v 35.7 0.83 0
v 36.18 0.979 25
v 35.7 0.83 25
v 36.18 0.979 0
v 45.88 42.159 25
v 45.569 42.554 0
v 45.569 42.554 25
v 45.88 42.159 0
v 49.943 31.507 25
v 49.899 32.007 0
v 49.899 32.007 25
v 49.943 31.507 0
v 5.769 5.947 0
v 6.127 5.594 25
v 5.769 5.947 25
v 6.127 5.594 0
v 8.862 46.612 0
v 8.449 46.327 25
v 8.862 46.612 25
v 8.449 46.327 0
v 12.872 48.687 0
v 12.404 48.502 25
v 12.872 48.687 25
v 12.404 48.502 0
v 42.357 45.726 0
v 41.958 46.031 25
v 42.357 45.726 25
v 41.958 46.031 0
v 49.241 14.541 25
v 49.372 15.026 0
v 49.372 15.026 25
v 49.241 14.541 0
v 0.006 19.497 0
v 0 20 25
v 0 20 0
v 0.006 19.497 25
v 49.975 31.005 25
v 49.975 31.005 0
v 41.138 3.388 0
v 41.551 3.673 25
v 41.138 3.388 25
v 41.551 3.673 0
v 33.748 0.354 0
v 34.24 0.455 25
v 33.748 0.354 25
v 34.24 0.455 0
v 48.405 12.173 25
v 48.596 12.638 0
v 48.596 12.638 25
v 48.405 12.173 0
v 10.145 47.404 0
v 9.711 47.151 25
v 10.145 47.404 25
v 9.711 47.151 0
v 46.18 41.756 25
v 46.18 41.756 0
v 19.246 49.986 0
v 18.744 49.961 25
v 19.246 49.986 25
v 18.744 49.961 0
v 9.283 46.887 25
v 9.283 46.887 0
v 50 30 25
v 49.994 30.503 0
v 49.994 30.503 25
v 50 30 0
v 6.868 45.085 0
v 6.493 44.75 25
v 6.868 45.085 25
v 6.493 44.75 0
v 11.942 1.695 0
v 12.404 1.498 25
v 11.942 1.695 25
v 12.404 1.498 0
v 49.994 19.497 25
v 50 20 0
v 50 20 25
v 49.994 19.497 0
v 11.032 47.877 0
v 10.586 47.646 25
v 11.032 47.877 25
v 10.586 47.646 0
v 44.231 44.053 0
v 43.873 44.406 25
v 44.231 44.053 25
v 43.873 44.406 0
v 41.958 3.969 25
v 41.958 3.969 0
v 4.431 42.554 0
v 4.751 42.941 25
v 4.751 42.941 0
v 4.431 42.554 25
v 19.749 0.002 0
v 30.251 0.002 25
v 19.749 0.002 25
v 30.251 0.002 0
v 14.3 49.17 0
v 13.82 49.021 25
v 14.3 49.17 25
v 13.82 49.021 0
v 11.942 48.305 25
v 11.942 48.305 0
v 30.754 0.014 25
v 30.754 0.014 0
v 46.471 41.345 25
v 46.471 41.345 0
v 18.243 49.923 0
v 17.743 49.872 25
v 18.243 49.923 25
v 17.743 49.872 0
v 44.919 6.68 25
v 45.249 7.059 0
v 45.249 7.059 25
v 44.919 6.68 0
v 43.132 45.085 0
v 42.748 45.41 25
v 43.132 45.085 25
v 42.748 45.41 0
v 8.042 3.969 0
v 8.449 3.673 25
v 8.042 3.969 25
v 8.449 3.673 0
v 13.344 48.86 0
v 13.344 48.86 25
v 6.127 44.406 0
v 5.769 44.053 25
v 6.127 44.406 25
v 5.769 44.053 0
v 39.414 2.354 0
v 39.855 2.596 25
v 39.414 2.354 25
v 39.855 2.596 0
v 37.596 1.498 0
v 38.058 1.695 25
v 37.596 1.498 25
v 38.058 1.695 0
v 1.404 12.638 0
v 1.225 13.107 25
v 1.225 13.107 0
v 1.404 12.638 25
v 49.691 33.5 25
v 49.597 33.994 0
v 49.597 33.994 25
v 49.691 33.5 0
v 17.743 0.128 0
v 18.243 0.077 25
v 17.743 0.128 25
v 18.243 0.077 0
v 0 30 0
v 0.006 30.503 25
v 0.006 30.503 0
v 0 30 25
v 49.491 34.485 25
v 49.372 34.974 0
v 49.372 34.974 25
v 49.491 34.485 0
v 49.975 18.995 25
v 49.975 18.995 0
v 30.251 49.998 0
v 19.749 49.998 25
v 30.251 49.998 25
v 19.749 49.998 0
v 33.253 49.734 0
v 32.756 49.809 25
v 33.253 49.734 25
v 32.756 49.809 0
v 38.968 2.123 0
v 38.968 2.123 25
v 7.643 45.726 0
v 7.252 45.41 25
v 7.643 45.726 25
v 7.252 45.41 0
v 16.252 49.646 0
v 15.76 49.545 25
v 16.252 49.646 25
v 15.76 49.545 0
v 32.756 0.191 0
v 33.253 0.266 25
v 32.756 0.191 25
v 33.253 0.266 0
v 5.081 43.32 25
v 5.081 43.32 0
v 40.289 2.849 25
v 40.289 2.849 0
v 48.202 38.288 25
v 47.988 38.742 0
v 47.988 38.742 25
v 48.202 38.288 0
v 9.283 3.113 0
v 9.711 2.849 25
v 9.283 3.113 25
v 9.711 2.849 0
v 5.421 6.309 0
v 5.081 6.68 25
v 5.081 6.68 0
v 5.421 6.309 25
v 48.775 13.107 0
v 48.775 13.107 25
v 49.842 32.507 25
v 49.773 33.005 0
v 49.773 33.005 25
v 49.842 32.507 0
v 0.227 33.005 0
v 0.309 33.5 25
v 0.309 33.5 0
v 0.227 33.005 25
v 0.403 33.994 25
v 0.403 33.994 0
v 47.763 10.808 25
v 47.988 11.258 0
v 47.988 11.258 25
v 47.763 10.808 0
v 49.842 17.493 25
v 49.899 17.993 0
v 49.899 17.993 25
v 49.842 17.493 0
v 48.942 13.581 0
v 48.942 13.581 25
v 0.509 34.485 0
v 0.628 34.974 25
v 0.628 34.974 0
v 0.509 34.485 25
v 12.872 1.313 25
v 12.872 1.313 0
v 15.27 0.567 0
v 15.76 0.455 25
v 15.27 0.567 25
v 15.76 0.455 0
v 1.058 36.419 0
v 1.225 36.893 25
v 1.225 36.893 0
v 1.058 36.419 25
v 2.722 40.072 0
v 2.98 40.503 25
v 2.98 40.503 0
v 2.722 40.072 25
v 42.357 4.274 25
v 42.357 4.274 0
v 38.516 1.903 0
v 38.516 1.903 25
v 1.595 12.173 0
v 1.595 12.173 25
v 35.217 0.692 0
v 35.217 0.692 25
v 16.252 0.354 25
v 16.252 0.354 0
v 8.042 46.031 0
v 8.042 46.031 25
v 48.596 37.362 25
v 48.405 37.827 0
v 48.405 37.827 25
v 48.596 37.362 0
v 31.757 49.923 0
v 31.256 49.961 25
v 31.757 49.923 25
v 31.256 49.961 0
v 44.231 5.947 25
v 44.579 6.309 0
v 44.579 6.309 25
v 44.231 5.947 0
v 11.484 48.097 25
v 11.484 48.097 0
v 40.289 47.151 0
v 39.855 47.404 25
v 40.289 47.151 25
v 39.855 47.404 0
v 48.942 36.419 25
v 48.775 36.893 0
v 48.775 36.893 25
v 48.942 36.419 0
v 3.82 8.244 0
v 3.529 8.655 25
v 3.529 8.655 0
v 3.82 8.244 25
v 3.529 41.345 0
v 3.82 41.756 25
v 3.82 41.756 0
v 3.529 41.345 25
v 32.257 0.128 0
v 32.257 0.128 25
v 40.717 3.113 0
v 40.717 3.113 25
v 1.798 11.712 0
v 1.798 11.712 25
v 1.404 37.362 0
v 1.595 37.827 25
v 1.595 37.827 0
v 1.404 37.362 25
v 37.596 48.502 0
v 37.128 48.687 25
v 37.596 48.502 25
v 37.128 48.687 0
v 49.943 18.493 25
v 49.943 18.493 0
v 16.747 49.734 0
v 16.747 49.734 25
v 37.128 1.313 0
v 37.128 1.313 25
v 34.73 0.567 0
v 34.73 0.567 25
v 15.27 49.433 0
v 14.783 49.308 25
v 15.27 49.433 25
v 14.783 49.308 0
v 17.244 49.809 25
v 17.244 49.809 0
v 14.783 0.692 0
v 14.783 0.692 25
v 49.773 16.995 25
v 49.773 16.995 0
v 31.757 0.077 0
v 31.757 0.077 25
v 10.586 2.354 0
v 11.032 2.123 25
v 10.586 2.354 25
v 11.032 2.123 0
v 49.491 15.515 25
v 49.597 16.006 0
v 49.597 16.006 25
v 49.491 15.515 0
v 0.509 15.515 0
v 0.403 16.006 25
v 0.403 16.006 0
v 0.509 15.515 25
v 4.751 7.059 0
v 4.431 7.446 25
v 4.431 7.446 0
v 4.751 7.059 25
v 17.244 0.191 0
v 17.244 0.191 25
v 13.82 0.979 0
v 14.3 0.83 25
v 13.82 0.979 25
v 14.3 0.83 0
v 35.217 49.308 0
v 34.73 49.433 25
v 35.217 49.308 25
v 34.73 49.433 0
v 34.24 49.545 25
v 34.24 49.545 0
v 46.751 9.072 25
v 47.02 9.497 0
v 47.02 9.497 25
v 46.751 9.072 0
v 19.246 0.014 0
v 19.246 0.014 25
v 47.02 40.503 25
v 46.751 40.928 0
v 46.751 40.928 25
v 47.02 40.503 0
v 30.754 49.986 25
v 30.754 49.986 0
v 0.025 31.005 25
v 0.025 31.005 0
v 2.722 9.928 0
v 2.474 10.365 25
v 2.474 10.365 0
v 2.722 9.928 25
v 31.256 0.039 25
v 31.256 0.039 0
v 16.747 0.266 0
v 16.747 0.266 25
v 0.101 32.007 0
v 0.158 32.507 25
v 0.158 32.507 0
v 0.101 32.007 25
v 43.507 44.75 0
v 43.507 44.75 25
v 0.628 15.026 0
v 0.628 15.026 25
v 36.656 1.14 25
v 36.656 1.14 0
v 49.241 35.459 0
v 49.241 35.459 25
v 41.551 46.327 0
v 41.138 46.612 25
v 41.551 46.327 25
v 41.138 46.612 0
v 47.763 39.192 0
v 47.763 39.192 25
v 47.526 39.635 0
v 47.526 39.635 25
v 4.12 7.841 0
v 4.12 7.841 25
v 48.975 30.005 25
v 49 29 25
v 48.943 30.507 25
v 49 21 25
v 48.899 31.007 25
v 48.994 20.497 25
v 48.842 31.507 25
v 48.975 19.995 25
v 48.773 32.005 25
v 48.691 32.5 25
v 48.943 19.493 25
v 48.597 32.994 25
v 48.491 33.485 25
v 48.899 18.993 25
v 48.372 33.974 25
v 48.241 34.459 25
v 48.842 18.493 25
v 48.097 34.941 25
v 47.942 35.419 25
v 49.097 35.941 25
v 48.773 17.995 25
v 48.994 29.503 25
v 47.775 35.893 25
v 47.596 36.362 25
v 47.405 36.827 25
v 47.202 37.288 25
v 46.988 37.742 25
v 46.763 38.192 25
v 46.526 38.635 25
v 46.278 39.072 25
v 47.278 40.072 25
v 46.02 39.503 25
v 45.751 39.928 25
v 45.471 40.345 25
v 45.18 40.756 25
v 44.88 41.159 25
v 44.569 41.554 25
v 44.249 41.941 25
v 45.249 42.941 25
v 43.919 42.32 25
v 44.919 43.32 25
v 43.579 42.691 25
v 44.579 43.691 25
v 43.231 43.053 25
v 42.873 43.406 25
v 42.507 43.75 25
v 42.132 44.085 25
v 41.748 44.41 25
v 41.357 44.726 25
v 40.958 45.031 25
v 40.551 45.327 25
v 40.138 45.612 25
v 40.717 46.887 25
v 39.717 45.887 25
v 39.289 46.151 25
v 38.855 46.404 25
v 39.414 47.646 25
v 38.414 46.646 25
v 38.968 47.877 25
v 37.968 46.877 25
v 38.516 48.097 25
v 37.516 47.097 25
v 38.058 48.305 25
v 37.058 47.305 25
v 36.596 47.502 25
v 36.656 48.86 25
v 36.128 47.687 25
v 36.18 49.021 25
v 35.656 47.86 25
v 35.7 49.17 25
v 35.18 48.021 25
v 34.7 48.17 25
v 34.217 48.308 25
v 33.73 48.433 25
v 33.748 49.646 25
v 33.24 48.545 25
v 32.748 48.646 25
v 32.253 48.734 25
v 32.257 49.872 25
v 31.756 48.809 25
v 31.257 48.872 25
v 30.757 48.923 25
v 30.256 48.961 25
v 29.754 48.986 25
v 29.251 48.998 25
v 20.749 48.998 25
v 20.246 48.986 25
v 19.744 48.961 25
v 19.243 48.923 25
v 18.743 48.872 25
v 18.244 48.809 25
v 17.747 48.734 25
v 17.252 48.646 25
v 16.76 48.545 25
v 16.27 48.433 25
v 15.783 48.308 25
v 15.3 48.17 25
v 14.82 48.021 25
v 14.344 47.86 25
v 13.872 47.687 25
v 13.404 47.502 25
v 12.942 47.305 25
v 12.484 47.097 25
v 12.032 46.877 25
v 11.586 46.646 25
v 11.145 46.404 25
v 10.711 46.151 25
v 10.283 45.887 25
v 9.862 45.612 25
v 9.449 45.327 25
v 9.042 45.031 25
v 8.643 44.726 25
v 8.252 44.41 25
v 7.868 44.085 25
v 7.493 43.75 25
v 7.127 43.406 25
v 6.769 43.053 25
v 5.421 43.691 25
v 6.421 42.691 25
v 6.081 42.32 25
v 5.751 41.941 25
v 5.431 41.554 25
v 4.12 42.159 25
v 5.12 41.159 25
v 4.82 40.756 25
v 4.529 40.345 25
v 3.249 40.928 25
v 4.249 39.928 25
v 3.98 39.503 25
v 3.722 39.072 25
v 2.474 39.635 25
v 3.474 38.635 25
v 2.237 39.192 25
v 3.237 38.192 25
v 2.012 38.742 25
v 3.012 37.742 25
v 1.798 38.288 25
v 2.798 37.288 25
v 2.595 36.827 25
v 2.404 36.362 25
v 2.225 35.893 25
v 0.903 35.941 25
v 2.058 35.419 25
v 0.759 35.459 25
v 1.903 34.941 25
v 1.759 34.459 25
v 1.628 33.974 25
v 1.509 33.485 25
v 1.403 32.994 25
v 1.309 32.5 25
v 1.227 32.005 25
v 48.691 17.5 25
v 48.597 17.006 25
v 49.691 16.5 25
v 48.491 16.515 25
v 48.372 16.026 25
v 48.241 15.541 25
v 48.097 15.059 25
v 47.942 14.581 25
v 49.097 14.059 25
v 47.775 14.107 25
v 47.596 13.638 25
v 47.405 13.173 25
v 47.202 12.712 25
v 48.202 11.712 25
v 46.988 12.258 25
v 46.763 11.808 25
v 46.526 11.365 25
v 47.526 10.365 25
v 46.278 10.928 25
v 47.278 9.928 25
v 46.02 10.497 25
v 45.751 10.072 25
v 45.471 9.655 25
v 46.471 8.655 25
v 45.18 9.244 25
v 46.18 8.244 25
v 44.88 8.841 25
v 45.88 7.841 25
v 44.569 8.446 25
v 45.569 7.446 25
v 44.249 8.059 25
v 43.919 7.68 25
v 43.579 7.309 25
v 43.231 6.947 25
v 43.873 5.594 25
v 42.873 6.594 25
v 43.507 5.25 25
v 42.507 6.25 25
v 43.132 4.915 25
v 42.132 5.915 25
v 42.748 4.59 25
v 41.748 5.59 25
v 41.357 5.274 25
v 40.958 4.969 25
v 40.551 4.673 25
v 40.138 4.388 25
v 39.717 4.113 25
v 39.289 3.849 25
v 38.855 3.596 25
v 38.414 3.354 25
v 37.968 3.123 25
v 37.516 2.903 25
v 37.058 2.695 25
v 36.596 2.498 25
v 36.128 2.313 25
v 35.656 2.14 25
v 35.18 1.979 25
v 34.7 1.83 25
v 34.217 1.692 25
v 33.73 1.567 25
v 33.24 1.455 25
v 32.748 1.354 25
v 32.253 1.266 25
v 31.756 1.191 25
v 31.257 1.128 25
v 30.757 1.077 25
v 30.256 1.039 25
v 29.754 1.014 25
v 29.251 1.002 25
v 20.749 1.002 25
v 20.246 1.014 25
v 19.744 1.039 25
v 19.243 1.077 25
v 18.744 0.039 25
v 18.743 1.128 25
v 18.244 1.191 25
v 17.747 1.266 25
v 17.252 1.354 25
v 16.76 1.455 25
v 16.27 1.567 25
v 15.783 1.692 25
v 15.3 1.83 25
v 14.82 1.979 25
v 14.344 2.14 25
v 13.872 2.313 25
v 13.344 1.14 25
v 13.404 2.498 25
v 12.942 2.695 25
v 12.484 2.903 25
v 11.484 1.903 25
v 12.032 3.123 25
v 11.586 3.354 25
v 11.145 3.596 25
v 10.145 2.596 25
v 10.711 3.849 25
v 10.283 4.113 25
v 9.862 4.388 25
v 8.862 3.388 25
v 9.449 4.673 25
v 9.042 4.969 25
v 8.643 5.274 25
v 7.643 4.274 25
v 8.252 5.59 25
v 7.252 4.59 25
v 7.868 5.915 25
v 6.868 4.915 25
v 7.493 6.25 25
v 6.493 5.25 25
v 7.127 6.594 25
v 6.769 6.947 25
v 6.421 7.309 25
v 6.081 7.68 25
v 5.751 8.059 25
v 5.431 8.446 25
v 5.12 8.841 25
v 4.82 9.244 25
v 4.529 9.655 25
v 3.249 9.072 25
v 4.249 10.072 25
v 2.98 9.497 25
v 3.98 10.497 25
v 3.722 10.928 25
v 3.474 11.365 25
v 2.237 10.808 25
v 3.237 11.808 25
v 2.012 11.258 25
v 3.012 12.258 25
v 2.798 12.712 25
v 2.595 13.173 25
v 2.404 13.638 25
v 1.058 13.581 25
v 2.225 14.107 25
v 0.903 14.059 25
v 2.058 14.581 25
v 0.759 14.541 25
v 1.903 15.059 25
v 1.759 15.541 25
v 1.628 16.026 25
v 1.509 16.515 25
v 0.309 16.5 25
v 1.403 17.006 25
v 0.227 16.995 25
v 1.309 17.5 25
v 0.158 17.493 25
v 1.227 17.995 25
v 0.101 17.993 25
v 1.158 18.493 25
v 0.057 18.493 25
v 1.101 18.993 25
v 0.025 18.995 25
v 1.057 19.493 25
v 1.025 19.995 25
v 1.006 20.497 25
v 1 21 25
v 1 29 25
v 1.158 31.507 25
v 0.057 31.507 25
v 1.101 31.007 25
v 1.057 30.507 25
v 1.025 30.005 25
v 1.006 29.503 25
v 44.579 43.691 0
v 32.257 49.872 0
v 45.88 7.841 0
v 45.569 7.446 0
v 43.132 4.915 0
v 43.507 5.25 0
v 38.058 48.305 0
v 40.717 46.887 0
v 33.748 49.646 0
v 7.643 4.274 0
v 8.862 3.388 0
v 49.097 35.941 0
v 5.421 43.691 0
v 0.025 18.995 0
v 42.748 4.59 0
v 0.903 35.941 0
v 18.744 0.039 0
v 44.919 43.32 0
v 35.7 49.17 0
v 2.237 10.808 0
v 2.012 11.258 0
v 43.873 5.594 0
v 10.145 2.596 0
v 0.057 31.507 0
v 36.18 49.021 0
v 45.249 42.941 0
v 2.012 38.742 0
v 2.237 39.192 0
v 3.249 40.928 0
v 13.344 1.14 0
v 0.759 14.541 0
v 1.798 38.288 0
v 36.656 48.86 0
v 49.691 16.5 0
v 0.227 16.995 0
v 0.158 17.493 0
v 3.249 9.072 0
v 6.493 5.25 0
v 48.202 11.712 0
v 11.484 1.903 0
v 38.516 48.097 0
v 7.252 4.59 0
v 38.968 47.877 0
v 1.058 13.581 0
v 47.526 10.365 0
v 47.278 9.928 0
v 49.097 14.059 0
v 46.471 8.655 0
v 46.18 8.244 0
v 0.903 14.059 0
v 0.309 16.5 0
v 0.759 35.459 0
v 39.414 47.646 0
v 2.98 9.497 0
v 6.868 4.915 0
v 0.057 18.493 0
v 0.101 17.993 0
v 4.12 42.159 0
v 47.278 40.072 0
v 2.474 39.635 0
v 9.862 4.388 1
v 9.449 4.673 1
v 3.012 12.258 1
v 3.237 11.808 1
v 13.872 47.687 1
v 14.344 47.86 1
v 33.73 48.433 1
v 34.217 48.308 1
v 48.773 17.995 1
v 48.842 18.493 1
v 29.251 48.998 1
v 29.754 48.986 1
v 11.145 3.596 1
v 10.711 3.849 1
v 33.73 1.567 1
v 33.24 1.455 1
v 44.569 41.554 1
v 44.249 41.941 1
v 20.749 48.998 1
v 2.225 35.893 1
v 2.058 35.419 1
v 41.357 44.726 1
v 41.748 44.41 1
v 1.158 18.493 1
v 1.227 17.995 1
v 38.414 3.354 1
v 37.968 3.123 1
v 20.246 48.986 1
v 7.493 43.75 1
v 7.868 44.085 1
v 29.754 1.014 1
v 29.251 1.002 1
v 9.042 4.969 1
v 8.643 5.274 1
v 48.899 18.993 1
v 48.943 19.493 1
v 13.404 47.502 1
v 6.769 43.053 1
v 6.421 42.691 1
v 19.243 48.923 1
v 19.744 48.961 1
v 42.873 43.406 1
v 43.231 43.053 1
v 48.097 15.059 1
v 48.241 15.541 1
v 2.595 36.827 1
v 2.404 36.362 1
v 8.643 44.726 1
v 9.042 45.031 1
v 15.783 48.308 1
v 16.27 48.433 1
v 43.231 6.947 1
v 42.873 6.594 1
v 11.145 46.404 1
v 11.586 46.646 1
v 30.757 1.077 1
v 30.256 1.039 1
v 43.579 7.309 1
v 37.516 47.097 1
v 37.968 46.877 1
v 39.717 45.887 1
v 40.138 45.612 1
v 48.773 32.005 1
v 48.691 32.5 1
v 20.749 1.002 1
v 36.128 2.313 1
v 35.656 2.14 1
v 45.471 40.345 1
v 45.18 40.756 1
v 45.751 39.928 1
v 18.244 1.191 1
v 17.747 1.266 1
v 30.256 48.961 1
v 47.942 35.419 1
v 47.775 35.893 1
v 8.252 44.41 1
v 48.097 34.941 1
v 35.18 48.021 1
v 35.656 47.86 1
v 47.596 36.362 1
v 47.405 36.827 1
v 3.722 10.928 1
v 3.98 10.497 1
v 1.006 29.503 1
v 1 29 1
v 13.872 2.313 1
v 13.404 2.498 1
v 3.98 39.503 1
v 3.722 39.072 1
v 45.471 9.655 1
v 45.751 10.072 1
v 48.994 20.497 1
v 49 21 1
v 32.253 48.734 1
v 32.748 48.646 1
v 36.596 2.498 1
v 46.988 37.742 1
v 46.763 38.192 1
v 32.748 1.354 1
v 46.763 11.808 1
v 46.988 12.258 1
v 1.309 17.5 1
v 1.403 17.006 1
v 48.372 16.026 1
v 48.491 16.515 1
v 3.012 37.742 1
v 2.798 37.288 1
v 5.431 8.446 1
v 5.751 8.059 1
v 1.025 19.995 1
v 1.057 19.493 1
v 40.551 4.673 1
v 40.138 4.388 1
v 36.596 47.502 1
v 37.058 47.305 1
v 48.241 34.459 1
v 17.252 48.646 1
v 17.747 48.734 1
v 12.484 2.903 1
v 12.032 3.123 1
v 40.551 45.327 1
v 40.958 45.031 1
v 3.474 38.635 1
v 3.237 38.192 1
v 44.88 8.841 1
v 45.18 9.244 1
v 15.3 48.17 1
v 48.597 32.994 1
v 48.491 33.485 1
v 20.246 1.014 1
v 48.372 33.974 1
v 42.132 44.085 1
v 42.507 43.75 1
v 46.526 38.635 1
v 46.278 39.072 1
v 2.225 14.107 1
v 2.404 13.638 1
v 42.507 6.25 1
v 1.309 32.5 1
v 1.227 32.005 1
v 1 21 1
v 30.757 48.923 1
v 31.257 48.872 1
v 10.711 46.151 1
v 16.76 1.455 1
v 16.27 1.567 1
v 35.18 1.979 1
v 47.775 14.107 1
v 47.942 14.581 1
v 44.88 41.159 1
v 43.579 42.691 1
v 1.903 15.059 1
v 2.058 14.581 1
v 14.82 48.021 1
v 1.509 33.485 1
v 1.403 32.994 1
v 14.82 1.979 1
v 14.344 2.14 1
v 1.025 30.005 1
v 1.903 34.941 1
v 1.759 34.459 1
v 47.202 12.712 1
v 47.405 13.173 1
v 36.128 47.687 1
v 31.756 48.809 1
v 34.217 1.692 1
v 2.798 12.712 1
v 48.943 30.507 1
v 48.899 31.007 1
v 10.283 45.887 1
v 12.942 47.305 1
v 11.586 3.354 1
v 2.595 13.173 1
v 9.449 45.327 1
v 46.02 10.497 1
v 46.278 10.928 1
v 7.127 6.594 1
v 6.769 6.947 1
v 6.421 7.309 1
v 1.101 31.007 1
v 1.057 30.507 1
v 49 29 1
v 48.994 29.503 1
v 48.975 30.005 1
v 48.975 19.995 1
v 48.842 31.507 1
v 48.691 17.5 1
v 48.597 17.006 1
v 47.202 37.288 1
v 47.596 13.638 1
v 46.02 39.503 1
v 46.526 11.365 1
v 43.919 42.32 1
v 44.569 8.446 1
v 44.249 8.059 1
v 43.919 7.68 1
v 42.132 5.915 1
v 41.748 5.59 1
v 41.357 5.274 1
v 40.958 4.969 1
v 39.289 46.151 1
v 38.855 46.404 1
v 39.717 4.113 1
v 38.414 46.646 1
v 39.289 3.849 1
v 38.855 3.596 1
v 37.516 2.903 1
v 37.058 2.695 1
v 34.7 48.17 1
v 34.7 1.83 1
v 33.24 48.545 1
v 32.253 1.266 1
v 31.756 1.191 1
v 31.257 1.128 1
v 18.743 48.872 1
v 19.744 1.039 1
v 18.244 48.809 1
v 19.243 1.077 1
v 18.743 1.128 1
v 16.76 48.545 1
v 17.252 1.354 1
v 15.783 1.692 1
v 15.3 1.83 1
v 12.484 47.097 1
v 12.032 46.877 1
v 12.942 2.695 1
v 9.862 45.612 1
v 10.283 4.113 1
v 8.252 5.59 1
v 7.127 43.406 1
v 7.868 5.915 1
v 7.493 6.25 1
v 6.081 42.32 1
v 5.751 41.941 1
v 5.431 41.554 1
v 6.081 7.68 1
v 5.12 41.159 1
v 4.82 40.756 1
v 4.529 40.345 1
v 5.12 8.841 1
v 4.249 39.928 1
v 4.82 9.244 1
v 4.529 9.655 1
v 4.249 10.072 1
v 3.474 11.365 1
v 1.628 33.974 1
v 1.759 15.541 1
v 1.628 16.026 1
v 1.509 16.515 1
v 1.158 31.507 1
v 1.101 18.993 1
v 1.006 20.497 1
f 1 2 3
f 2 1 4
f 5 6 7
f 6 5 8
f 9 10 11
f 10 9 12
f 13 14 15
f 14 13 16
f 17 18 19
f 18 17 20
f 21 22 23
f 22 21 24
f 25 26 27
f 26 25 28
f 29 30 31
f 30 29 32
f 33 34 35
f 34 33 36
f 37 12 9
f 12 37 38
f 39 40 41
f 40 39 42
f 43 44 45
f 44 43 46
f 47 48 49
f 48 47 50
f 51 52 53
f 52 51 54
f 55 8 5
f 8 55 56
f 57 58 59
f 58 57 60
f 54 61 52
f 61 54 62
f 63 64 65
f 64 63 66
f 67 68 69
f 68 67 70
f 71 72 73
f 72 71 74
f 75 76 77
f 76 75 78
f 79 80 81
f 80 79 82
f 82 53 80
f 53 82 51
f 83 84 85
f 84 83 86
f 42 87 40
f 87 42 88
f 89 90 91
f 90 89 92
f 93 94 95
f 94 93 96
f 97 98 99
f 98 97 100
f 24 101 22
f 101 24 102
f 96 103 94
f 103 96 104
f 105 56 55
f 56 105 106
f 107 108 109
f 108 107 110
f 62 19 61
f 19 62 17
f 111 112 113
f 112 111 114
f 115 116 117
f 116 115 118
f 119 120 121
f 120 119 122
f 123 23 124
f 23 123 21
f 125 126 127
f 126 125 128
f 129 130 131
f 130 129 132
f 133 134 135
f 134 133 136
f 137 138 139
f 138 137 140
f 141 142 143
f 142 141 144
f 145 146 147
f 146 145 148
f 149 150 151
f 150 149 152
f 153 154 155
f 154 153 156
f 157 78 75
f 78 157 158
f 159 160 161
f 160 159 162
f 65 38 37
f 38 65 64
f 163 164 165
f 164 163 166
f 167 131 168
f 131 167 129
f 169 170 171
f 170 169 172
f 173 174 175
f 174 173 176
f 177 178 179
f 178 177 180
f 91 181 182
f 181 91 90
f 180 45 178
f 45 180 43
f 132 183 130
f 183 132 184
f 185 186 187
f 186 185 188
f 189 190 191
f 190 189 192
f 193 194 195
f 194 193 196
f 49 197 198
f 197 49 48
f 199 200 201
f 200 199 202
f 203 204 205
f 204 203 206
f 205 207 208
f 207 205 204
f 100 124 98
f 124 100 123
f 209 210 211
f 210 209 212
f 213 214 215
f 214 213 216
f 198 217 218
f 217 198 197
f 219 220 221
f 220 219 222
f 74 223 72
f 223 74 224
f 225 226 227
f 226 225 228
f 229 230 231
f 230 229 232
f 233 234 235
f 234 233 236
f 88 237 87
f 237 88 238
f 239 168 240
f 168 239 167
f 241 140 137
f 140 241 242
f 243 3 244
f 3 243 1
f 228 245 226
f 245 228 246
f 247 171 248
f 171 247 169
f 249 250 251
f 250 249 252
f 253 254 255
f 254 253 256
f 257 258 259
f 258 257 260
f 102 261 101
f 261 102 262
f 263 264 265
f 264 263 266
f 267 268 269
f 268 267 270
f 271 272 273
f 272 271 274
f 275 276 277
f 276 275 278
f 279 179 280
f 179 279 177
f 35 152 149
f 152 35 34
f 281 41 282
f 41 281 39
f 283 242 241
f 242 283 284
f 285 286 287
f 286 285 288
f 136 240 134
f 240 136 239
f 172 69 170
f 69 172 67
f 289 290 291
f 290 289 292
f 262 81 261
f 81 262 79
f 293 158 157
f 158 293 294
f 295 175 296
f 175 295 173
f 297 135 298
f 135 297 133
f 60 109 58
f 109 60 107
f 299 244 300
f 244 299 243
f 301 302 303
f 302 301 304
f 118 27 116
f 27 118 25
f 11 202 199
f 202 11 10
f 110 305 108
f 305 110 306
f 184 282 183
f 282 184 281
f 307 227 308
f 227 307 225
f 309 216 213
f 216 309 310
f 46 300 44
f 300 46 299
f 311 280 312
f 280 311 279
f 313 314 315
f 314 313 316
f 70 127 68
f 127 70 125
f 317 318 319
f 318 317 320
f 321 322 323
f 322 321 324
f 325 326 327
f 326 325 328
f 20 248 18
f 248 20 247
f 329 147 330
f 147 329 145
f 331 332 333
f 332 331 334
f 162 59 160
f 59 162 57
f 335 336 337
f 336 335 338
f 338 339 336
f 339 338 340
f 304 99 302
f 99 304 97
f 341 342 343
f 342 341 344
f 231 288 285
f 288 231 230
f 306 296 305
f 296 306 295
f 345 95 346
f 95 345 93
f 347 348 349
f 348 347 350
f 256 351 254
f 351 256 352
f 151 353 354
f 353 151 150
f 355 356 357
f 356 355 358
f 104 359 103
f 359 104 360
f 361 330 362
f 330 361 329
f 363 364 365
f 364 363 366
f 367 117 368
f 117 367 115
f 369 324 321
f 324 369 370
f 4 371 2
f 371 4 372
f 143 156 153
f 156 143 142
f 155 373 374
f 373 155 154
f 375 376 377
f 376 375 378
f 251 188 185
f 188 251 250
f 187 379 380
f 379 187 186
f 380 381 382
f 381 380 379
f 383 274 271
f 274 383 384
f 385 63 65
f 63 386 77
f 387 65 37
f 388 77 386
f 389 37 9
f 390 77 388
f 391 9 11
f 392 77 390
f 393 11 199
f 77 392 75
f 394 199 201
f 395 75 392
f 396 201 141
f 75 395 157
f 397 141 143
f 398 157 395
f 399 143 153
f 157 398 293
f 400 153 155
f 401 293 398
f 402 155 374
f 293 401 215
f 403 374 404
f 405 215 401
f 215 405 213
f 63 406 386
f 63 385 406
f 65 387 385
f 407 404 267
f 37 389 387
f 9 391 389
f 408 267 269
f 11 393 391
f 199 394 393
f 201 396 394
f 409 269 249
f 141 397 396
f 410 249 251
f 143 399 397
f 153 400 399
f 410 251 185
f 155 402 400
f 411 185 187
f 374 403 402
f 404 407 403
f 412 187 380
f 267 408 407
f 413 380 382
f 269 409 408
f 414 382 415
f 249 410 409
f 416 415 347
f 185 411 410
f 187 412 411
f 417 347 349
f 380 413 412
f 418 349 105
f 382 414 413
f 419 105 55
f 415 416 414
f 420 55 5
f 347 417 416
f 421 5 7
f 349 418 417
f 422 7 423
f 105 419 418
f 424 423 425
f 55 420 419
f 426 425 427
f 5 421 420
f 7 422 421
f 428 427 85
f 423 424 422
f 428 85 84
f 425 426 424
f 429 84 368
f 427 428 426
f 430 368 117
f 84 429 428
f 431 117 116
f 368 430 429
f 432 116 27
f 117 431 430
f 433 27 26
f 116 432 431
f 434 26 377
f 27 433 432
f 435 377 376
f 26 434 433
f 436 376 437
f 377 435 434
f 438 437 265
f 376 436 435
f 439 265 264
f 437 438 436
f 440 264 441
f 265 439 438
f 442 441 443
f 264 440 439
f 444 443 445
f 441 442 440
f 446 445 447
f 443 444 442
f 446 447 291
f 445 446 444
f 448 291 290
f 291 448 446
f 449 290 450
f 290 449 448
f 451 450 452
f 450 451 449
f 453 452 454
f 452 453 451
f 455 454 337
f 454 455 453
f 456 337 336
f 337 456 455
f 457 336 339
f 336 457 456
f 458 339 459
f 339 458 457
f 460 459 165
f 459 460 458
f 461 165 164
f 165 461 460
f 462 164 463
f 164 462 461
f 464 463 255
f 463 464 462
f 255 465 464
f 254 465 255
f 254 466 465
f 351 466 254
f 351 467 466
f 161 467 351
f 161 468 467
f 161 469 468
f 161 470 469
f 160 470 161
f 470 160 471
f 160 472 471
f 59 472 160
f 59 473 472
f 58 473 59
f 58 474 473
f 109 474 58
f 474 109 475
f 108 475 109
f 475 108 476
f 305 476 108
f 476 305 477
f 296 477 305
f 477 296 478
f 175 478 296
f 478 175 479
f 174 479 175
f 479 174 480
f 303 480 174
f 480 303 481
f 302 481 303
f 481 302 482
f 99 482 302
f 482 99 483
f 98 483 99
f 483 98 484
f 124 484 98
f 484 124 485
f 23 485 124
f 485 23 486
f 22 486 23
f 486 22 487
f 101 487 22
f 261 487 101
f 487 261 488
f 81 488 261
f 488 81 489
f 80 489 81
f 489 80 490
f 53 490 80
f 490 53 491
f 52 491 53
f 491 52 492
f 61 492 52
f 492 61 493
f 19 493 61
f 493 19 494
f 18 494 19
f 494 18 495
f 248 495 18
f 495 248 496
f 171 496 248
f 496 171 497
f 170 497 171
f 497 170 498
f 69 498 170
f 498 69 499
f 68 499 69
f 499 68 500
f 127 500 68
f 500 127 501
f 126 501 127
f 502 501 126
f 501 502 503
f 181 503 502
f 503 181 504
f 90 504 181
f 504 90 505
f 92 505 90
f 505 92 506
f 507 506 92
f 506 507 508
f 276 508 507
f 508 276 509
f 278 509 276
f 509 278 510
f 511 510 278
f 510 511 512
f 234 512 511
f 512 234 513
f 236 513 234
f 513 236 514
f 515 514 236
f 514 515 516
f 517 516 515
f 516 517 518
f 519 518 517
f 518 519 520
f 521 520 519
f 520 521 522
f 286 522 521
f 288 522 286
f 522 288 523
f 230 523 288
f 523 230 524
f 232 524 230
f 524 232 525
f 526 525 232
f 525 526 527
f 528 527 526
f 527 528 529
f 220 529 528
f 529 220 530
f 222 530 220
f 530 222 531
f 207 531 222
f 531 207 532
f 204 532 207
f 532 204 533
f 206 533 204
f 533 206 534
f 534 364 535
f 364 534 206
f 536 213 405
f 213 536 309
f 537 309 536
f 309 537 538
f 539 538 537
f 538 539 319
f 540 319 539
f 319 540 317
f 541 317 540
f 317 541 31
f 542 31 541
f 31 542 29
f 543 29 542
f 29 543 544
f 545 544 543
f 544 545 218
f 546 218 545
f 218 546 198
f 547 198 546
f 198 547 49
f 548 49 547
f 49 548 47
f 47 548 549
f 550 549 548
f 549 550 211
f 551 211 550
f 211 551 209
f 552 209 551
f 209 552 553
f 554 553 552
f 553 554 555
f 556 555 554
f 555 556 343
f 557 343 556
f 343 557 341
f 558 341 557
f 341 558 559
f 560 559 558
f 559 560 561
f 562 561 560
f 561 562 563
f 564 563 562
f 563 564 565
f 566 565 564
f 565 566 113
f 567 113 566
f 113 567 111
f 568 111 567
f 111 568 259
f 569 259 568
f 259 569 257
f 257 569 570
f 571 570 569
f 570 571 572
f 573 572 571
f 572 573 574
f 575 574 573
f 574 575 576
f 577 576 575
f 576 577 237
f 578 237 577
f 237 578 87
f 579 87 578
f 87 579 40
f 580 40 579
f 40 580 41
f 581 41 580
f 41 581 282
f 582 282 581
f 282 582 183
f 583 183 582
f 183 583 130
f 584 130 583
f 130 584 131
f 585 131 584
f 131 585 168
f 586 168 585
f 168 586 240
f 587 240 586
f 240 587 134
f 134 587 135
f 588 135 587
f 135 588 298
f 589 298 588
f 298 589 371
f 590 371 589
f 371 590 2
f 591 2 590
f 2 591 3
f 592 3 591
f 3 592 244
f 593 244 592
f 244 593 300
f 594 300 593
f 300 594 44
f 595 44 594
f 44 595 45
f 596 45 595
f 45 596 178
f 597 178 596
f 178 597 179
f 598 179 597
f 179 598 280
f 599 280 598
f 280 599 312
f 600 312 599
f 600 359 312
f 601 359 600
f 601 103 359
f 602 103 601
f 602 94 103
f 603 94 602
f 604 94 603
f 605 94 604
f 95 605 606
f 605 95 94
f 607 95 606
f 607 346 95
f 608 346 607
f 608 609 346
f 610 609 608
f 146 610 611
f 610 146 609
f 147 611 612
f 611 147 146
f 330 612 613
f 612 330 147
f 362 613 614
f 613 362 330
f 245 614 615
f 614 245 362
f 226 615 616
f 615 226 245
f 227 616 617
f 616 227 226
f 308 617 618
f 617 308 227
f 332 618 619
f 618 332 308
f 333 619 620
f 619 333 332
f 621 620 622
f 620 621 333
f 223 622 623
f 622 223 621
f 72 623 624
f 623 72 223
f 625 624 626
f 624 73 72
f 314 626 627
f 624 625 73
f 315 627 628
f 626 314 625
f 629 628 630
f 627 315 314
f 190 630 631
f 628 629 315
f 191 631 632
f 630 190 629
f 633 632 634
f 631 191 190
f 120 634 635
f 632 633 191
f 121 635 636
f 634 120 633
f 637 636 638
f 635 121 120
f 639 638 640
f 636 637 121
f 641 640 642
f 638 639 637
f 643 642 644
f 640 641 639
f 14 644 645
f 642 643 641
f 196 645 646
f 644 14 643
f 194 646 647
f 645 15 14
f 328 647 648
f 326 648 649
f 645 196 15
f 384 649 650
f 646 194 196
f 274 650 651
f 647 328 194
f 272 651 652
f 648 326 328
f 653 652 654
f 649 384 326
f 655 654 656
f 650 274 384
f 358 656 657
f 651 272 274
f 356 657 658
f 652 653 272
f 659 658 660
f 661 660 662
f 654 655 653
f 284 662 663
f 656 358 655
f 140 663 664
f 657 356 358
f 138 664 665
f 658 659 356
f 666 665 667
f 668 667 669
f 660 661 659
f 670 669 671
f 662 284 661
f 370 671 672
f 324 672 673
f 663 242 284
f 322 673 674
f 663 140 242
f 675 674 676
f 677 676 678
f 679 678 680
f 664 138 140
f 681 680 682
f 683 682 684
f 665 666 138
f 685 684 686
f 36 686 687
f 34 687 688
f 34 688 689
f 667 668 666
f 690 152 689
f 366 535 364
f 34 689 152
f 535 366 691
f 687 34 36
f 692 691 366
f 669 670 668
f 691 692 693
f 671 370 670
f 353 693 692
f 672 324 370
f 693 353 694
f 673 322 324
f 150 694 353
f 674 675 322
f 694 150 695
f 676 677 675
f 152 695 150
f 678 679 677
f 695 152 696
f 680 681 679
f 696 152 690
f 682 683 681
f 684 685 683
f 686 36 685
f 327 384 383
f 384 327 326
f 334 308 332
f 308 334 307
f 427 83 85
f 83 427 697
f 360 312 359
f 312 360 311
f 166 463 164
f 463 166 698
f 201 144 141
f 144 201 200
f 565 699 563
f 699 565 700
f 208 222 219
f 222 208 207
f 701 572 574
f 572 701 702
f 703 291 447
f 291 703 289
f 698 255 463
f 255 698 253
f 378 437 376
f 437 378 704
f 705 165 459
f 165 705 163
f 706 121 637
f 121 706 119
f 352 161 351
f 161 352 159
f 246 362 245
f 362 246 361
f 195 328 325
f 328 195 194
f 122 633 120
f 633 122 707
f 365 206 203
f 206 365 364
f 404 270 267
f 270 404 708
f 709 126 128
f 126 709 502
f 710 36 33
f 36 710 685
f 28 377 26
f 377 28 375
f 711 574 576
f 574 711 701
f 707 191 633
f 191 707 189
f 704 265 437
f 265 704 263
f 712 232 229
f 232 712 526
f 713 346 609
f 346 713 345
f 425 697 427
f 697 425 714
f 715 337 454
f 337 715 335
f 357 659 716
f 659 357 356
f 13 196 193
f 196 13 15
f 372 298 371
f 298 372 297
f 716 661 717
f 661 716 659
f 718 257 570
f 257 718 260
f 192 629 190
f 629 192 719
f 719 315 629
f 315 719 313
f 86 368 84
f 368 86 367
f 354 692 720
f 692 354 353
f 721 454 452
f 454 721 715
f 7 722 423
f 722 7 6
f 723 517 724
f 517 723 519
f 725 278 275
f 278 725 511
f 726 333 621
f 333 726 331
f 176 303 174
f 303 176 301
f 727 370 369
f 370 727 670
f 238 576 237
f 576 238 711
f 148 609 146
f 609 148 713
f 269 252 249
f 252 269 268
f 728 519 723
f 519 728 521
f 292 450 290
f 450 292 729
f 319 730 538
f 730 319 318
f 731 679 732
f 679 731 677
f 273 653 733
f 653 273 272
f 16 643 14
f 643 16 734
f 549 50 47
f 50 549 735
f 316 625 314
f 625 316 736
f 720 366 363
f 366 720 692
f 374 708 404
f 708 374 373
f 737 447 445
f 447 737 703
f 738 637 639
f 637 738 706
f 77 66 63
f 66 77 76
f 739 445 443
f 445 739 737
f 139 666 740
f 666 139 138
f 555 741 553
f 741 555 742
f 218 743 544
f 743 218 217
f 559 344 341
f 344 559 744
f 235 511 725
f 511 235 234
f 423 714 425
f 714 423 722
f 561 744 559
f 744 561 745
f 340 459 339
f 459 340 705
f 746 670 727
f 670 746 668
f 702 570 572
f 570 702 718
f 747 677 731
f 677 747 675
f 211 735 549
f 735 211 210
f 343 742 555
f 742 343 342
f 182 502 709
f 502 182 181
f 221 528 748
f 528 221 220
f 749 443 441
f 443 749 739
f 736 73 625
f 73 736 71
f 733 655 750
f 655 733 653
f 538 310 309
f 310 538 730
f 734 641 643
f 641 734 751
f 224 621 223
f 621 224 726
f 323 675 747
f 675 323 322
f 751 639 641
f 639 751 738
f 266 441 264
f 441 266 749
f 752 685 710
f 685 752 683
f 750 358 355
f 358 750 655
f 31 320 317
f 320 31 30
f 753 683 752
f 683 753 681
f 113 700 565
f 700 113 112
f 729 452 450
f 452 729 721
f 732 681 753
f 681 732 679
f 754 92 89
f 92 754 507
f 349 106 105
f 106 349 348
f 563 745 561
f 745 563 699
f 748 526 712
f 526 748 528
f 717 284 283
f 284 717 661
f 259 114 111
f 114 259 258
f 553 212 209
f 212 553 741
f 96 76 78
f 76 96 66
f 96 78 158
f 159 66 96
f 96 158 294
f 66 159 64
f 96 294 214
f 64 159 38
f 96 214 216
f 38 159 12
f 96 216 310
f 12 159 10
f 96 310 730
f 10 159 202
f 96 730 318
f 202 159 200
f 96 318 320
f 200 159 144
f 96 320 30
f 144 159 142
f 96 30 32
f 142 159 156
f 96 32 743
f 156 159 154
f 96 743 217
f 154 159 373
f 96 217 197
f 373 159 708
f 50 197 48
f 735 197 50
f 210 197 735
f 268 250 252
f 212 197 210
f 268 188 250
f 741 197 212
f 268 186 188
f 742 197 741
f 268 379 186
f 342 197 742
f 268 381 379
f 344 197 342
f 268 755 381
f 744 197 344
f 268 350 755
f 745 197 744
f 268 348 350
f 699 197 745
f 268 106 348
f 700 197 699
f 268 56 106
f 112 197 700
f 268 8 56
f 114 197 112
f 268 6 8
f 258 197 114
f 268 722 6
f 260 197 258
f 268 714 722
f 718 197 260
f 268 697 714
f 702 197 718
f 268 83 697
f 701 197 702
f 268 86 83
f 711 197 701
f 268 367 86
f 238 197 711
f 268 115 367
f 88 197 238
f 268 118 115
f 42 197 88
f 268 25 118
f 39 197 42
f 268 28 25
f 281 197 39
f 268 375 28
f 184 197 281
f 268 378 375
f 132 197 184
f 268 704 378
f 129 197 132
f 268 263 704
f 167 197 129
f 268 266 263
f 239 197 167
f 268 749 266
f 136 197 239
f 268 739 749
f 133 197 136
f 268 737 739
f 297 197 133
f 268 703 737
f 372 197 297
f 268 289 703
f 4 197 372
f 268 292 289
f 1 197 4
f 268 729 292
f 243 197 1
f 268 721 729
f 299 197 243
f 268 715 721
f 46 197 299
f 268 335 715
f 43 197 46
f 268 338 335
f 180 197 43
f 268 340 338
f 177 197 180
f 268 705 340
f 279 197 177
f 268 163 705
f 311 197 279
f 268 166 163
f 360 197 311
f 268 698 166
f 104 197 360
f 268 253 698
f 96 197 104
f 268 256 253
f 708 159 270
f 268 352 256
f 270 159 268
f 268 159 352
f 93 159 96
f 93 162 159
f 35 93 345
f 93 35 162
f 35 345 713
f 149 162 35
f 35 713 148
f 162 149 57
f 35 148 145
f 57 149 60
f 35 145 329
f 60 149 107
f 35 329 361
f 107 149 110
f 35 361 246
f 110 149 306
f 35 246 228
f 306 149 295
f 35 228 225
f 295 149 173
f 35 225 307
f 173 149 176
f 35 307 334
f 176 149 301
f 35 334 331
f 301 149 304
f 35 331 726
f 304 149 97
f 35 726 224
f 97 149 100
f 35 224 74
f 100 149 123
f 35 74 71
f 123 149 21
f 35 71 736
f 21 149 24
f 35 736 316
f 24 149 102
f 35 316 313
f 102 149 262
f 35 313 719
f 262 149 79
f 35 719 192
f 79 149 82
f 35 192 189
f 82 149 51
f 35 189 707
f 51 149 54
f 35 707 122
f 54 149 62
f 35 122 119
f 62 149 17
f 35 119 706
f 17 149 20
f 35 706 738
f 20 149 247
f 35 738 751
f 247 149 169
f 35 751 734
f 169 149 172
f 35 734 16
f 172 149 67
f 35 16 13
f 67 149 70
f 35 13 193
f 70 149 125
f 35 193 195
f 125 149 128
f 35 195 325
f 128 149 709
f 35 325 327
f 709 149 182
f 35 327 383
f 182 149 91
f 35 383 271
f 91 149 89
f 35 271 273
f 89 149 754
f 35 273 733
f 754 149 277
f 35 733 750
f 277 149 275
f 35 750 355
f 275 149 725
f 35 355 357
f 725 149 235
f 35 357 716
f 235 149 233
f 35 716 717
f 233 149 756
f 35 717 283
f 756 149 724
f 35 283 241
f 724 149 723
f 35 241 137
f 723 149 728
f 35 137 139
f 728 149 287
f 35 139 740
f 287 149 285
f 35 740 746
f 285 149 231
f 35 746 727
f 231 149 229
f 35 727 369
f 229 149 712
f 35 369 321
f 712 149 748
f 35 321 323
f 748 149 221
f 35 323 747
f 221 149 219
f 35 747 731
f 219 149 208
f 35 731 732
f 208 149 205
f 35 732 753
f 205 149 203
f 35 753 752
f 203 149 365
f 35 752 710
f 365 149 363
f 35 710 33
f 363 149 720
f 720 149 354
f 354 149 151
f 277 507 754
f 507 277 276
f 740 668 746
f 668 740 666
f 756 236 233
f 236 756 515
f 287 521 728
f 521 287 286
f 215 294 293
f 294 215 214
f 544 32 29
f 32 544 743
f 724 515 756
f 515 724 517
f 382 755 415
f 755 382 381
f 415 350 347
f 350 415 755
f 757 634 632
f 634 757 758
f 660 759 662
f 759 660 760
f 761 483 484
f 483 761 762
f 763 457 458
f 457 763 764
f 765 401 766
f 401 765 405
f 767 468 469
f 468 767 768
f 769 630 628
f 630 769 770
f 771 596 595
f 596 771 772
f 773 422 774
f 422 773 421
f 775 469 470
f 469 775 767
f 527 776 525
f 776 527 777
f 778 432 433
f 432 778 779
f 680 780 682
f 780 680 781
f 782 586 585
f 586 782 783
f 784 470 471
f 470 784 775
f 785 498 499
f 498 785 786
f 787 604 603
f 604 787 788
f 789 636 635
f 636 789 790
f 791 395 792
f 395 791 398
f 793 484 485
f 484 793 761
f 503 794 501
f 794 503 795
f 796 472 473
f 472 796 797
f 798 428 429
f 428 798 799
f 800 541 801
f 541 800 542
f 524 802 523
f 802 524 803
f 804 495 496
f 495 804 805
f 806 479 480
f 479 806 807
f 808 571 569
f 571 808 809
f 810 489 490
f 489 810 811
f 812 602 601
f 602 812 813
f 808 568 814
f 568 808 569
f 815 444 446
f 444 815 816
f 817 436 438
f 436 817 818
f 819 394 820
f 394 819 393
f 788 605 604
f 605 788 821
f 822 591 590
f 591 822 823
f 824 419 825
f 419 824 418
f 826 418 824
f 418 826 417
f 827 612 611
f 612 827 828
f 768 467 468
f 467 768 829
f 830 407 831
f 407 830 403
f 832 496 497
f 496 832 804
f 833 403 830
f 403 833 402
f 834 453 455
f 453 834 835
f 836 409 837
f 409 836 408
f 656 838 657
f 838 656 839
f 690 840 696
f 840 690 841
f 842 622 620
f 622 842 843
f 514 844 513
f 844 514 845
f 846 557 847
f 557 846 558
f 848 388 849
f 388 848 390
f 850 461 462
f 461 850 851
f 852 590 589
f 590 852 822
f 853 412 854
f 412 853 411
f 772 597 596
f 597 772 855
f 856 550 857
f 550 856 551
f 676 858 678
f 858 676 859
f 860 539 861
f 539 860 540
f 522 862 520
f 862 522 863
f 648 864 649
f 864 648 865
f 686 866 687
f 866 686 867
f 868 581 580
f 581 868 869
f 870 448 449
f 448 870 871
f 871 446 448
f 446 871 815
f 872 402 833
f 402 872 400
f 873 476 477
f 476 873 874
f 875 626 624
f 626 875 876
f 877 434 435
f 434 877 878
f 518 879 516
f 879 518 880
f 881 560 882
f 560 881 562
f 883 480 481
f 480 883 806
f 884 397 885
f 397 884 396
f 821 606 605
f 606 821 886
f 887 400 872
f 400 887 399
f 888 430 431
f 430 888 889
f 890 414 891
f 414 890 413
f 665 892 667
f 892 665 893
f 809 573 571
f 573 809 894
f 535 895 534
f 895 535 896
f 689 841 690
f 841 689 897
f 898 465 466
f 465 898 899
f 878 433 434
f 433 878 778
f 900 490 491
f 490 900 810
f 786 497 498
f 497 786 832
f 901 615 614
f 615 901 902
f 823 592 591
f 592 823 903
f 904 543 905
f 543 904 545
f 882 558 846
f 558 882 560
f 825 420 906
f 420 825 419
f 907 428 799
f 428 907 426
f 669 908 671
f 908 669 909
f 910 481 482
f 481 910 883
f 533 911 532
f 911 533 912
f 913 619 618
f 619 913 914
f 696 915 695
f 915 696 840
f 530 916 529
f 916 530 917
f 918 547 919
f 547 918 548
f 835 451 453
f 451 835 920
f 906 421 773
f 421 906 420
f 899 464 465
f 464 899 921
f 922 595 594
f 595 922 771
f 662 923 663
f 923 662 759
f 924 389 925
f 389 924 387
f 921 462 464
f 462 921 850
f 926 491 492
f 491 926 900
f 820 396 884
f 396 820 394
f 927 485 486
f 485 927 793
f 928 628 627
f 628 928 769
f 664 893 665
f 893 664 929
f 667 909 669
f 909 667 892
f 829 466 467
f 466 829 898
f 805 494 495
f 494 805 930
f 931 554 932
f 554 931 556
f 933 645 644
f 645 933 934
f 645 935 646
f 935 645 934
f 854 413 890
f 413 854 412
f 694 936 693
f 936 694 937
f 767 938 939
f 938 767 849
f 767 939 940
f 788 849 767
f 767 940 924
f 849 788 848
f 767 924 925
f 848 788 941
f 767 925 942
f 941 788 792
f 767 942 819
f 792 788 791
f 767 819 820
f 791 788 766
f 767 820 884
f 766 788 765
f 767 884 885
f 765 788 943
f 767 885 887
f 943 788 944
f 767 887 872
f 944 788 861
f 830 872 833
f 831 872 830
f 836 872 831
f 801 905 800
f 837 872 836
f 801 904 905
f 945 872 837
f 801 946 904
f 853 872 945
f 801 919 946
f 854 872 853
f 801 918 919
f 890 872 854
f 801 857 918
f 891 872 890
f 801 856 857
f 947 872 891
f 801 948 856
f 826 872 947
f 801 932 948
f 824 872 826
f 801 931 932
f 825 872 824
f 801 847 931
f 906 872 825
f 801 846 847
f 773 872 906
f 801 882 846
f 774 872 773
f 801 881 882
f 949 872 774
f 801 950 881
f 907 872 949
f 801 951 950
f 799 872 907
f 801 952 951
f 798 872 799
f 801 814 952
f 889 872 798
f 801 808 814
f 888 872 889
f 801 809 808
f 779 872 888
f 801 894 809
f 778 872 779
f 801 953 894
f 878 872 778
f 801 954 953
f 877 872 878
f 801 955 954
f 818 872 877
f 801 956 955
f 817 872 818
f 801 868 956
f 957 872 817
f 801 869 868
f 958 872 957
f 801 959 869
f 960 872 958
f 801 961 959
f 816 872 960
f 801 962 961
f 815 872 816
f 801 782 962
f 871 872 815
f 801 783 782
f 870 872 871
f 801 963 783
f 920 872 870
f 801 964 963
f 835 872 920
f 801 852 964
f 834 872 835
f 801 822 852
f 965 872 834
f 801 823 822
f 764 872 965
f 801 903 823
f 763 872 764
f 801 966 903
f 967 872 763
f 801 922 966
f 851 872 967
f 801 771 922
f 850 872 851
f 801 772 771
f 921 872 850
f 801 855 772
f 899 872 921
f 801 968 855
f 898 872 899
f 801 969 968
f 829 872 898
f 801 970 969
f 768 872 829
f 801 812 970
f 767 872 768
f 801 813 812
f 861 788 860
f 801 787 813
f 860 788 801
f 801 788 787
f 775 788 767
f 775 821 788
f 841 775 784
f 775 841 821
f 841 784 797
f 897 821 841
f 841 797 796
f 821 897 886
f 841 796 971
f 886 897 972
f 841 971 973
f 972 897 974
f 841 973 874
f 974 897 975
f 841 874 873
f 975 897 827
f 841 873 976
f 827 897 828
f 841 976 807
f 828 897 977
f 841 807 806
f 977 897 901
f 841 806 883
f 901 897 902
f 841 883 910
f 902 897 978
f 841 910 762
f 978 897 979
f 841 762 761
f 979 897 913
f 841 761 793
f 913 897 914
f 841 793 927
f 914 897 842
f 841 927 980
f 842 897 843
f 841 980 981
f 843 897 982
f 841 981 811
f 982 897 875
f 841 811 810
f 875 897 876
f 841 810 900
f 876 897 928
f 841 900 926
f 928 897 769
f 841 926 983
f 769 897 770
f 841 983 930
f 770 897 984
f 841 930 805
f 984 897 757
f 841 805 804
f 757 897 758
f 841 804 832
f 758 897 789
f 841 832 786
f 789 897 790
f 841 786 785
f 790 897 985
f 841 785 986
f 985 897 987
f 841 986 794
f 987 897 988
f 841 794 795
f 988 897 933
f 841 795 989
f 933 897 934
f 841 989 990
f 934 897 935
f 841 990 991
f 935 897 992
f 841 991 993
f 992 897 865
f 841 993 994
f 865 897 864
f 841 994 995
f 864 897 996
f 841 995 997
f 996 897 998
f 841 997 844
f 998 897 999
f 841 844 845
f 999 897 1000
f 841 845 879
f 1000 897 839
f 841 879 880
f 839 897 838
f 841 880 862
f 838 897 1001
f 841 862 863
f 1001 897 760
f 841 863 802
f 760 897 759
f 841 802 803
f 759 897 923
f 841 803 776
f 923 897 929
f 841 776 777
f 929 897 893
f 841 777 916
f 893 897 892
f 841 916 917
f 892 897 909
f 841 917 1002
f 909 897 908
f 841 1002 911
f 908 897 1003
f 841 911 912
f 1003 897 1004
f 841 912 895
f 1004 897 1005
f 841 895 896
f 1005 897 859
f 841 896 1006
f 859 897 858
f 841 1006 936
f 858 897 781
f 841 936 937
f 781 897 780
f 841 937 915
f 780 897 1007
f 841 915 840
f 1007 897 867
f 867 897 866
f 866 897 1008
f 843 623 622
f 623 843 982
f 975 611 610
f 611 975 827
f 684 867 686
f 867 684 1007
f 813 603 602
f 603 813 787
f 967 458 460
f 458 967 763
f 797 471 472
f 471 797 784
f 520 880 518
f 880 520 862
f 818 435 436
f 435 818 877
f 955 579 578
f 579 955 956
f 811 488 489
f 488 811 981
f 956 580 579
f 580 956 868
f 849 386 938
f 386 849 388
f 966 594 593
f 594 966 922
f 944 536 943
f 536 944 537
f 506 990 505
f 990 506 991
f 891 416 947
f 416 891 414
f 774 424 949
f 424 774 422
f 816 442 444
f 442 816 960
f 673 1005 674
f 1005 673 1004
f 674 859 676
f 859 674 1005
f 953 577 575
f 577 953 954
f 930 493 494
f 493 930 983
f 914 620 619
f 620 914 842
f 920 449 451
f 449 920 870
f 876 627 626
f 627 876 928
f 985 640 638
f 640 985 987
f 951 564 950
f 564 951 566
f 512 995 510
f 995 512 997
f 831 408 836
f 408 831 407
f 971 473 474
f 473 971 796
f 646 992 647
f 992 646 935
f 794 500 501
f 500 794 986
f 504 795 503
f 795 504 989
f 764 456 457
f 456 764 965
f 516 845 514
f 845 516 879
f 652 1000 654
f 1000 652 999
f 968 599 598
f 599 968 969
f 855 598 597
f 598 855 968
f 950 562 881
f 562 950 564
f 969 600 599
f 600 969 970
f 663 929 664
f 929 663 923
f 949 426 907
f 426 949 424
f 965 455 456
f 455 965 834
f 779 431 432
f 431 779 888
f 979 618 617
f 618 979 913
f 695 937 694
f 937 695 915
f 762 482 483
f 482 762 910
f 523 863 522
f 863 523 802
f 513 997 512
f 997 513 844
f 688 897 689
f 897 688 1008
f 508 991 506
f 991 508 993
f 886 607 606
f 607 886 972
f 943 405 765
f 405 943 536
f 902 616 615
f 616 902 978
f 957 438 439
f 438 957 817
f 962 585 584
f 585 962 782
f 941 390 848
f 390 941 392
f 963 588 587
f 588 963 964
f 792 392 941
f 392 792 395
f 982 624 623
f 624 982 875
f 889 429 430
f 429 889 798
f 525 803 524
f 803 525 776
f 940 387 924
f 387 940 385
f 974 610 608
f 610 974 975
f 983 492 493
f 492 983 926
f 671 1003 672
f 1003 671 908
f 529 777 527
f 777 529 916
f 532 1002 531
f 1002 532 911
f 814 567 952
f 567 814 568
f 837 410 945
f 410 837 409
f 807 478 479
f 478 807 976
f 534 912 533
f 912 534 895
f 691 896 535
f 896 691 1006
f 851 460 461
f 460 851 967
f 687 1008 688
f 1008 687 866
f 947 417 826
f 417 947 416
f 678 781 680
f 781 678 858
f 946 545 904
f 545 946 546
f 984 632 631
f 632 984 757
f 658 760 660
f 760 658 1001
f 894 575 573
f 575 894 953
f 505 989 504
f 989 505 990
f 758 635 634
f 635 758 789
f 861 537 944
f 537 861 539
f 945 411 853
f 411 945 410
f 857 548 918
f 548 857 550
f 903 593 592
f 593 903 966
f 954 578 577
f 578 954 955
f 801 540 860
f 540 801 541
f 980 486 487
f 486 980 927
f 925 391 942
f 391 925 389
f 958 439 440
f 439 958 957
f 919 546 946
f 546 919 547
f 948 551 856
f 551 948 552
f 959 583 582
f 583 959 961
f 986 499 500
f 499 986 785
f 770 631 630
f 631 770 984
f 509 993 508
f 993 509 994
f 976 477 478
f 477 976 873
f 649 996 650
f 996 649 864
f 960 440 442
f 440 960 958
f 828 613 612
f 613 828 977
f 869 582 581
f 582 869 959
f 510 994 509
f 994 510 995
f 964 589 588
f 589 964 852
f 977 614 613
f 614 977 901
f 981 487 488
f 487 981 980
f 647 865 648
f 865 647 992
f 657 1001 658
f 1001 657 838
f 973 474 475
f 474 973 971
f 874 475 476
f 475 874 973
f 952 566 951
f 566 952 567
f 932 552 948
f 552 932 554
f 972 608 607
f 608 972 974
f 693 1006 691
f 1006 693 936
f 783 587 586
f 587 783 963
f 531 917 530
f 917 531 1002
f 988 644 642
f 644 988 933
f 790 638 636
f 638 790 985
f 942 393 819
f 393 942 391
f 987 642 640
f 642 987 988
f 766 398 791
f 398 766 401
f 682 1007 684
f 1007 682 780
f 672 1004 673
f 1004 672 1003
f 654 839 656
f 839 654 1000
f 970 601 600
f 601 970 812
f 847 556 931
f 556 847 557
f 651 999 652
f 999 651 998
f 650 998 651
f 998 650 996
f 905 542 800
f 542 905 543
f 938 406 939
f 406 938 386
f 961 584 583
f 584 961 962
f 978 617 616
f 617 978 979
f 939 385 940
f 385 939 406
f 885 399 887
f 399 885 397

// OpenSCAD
//basic af box
// preview[view:south, tilt:top]

//CUSTOMIZER VARIABLES
$fn = $fn + 250;

//Length
x = 50; // [1:150]
//Width
y = 50; // [1:150]
//Height
z = 25; // [1:150]

wall_thickness = 1; // [1:150]
base_thickness = 1; // [1:150]
chamfer_edge = 20; // [1:150]

//CUSTOMIZER VARIABLES END

difference(){
    roundedcube(x,y,z,chamfer_edge);
    translate([wall_thickness,wall_thickness,base_thickness])
    roundedcube(x-(wall_thickness*2),y-(wall_thickness*2),z,chamfer_edge);
}

module roundedcube(xdim ,ydim ,zdim,rdim){
hull(){
    translate([rdim,rdim,0])cylinder(h=zdim,r=rdim);
    translate([xdim-rdim,rdim,0])cylinder(h=zdim,r=rdim);
    translate([rdim,ydim-rdim,0])cylinder(h=zdim,r=rdim);
    translate([xdim-rdim,ydim-rdim,0])cylinder(h=zdim,r=rdim);
}}
